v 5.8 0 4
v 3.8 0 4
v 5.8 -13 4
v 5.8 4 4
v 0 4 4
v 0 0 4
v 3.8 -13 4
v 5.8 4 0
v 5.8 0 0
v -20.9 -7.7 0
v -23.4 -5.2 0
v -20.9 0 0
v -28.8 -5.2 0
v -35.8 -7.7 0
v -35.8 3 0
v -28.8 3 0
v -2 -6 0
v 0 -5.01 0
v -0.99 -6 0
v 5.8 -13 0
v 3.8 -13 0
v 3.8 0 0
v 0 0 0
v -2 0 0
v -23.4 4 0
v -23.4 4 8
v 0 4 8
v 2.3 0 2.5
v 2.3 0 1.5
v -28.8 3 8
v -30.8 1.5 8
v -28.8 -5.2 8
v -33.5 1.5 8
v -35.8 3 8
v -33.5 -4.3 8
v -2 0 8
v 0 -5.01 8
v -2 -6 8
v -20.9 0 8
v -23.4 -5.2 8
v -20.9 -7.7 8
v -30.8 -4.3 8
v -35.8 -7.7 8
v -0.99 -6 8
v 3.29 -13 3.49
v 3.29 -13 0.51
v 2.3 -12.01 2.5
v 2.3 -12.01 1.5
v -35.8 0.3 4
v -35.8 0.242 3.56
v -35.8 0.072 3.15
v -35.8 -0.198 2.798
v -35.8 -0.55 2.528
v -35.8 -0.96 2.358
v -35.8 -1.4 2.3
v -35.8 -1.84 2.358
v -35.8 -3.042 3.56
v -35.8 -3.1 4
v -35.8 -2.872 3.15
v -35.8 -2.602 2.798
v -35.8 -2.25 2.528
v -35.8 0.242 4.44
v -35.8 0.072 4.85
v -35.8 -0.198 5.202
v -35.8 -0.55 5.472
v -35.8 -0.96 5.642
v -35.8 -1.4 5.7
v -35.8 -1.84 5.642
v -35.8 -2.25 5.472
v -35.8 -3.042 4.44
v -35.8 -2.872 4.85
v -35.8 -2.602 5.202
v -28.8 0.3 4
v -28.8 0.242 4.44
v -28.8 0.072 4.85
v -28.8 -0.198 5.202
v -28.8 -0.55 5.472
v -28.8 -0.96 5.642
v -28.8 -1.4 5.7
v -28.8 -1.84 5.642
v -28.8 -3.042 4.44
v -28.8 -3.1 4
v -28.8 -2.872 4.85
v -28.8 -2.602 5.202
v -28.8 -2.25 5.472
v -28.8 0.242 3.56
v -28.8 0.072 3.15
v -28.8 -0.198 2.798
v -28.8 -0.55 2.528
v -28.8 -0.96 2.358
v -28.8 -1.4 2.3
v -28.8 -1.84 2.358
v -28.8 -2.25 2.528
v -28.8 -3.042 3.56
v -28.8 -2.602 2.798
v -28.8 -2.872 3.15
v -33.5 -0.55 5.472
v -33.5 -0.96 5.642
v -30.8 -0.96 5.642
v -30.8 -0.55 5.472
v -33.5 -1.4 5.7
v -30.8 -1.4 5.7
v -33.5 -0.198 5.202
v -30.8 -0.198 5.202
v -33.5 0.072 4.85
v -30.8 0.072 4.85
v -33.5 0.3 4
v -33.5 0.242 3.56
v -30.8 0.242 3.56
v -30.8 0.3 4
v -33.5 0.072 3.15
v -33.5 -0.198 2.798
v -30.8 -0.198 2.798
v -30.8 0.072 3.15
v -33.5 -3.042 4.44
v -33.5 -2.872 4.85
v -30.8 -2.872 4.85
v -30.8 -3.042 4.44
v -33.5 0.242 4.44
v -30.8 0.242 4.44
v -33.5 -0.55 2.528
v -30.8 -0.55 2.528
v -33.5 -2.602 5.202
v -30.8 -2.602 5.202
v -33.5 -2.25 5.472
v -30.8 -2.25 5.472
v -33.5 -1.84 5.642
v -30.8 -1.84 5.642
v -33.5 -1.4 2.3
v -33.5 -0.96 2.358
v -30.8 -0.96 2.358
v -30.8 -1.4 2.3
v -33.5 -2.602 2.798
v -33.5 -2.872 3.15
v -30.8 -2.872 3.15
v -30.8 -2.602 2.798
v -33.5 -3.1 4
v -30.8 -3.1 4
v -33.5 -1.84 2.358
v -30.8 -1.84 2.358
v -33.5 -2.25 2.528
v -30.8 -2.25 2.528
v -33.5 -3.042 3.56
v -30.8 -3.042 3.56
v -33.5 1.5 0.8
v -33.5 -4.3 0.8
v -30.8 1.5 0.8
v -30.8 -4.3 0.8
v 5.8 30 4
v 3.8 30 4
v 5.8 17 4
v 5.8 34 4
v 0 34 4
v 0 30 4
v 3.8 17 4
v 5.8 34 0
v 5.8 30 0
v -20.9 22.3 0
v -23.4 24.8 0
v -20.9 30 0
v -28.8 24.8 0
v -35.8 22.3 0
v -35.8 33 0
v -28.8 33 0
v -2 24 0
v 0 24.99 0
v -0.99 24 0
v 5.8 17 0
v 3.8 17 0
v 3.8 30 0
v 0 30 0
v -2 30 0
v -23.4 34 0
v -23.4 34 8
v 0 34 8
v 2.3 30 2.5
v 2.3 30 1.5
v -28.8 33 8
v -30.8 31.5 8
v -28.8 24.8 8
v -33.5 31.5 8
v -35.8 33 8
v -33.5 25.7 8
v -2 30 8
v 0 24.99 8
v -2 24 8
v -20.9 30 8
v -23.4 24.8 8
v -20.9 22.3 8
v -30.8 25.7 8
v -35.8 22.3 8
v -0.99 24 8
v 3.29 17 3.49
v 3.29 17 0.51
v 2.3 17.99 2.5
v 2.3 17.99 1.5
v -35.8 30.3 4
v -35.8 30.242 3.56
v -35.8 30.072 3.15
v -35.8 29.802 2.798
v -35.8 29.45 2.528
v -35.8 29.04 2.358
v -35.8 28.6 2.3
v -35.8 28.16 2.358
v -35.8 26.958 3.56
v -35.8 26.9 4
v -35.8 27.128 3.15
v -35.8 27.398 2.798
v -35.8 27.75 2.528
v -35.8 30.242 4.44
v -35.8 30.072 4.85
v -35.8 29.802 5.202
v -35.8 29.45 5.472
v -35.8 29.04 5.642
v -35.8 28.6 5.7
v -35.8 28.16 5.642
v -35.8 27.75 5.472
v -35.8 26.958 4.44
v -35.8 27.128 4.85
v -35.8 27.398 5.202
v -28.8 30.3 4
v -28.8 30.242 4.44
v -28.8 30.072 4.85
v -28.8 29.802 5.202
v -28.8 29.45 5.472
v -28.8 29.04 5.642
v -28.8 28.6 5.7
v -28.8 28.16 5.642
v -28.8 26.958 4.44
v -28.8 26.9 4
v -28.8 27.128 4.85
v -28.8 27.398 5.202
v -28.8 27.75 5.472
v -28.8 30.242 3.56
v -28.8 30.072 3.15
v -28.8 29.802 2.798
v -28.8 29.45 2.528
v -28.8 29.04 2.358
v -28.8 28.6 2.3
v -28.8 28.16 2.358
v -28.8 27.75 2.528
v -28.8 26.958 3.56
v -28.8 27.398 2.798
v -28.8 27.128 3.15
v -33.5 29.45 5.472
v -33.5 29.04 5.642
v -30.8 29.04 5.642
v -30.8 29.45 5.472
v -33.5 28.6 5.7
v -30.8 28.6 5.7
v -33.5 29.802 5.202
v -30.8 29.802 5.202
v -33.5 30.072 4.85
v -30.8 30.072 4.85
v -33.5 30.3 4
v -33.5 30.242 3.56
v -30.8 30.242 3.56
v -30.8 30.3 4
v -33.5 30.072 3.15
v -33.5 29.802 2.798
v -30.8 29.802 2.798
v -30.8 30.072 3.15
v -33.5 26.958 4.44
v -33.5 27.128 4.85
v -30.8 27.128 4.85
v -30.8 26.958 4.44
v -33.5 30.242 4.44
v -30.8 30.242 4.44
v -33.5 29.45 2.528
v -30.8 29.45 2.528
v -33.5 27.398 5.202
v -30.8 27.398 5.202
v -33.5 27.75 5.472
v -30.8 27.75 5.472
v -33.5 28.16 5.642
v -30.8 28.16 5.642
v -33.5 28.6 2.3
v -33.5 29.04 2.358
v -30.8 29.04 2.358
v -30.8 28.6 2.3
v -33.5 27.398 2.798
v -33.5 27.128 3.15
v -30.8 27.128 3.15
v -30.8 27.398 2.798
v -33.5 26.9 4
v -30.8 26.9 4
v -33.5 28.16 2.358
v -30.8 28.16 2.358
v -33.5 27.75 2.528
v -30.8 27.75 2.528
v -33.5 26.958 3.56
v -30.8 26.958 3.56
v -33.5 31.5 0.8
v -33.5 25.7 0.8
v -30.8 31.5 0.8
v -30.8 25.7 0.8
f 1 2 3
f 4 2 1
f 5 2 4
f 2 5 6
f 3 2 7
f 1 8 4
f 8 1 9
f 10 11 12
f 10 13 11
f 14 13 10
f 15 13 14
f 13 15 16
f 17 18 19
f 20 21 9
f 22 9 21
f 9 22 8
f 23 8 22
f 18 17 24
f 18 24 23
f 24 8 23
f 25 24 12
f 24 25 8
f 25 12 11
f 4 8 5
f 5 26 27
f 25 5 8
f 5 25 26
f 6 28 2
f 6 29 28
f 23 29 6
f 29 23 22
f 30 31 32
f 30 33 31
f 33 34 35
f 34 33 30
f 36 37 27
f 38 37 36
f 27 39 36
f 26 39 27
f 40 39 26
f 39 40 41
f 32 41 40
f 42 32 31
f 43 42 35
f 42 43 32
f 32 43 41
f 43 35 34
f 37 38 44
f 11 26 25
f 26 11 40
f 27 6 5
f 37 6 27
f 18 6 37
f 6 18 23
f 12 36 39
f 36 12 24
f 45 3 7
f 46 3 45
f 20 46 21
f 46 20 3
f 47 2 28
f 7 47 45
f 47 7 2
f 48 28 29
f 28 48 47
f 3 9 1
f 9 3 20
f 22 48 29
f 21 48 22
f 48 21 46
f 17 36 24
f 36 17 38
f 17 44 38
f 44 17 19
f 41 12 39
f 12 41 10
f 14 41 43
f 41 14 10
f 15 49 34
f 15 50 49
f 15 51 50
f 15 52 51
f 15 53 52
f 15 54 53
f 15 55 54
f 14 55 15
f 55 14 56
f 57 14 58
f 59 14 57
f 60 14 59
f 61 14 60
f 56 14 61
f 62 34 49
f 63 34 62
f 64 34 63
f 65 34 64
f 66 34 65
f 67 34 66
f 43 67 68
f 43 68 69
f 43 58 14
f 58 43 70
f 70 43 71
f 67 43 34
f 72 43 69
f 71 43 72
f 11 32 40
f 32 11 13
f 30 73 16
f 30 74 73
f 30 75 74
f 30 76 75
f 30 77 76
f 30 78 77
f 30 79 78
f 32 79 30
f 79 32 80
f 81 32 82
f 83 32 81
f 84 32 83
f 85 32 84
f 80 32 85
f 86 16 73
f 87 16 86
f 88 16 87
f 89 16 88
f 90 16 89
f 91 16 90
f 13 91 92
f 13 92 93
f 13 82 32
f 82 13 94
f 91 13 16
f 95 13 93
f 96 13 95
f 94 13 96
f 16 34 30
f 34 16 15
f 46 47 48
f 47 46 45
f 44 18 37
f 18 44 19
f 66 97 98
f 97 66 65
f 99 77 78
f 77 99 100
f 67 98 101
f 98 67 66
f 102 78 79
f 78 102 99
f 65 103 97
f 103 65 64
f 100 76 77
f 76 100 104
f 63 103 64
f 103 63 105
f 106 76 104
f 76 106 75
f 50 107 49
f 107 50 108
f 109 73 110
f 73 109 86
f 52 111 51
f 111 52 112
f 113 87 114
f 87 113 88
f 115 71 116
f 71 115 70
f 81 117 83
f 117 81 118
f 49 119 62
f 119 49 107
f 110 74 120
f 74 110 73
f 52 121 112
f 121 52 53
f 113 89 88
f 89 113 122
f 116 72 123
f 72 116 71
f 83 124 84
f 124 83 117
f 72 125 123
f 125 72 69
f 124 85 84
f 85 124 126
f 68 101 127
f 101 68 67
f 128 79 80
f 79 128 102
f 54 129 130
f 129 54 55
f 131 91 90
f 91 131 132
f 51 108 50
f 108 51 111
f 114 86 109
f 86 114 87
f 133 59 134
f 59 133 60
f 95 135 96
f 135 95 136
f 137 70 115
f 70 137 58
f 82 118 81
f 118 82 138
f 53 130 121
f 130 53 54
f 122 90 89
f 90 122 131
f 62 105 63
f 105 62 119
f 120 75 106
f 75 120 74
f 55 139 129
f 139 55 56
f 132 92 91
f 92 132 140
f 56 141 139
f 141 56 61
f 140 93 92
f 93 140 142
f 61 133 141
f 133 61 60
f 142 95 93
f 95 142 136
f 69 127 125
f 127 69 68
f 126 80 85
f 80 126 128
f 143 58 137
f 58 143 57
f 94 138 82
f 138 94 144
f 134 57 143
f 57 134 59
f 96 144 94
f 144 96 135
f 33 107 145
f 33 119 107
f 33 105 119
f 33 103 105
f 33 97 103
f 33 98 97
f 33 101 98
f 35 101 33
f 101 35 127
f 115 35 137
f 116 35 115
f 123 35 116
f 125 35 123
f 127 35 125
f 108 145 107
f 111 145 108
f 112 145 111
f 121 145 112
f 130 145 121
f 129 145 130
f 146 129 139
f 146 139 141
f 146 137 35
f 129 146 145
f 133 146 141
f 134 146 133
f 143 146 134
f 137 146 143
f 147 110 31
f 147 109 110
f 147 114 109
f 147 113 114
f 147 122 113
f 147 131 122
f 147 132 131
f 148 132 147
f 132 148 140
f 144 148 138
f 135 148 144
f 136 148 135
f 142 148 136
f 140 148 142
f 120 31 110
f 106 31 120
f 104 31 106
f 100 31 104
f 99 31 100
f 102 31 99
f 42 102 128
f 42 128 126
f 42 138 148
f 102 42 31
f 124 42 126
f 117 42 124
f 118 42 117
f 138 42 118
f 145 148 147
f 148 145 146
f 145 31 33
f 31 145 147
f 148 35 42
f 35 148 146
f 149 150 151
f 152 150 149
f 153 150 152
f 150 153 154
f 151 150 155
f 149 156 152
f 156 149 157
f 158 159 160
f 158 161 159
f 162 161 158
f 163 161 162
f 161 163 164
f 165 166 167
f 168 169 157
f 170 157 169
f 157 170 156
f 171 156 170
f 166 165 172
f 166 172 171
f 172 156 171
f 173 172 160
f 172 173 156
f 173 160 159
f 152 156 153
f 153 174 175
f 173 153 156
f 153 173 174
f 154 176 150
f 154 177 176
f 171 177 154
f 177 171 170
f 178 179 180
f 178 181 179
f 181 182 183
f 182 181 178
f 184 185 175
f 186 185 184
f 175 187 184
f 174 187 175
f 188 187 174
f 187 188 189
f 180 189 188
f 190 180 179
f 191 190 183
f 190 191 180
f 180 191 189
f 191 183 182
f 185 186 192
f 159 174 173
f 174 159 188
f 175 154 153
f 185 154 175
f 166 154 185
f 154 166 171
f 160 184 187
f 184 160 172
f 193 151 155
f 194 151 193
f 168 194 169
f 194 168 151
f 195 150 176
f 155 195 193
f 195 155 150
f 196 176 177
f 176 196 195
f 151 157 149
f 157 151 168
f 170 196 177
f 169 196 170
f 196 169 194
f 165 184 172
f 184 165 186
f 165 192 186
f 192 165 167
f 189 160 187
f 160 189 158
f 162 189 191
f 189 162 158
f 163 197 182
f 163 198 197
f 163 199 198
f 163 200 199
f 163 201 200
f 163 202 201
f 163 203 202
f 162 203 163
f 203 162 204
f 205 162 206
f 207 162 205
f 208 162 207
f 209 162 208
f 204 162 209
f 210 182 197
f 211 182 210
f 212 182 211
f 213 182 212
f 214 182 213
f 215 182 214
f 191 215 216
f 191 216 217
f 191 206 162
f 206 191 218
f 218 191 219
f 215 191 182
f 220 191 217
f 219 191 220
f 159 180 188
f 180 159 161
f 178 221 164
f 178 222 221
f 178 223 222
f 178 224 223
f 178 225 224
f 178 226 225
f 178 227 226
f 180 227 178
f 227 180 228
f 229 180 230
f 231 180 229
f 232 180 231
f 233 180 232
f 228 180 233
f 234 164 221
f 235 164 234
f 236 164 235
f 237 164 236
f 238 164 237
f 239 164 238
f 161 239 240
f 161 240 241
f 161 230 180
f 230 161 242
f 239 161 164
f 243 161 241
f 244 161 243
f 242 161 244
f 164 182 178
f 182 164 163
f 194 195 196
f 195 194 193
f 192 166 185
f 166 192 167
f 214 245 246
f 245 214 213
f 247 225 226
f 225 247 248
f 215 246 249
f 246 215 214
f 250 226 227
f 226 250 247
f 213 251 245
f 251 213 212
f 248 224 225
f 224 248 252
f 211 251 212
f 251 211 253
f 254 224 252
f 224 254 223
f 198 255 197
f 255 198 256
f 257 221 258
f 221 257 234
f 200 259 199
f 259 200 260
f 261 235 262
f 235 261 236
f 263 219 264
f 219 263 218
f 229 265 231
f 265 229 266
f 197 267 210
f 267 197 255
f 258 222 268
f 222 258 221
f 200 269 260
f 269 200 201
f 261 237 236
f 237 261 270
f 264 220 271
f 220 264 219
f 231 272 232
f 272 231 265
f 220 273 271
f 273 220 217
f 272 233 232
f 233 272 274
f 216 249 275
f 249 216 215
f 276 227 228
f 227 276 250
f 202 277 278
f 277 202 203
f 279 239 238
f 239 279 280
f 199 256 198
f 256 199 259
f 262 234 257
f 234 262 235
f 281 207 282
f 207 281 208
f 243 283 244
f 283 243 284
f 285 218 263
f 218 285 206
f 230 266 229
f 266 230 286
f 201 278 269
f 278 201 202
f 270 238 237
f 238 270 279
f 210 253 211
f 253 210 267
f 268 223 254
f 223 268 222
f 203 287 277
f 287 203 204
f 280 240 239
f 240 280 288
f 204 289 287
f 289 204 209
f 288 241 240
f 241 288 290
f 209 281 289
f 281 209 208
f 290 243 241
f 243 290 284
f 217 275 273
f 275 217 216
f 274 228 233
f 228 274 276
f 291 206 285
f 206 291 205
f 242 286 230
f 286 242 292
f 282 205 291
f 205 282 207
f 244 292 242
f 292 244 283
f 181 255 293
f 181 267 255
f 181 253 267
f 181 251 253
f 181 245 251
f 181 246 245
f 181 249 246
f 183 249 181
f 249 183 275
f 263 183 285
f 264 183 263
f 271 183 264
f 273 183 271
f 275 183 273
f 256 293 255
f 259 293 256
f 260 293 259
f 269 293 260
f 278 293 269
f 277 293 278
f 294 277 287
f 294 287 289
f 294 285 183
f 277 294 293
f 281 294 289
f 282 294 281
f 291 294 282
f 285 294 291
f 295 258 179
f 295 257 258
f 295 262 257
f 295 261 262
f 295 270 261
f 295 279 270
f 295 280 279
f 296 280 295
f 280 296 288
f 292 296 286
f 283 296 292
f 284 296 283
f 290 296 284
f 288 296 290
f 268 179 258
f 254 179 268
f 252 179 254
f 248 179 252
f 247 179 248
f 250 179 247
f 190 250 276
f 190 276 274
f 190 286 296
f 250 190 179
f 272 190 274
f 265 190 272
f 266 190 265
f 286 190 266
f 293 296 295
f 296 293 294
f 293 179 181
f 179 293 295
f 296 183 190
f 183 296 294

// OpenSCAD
// Inverted-U thermostat panel clip v0.5. Units: mm.
// v0.5 (2026-10-11): the frame hung ~6 mm too low on v0.4 clips. The user
// measured the hinge-screw centre 58 mm below the case top versus 52 mm
// needed (dial top edge, measured 52 mm). The vent-seating part is unchanged
// (proven); only the rail cradle and its captive-nut clamp move UP 6.0 mm
// relative to the bridge, so the same printed frame hangs 6 mm higher.
// Everything below is v0.4.
// v0.4 (2026-10-03): the v0.3 M3 screw self-tapped into a 2.5 mm pilot and
// split the clip along its print layers (clip prints on its side). v0.4
// uses a 3.4 mm clearance hole and a captive M3 nut in a side pocket of a
// thicker (7 mm) cradle front wall, so the screw never wedges the plastic.
// Panel/vent geometry is unchanged from v0.3, described below.
//
// v0.3 (2026-09-30): the v0.2 5.0 mm leg was too wide for the real vent;
// the leg and everything behind the front face are now 4.0 mm wide (-1 mm,
// user direction). The vent is modelled at <= 5.0 mm (observed bound).
// Otherwise identical to v0.2, described below.
//
// v0.2: clip-only revision after the v0.1 clip test (photos/2026-09-30_*).
//
// Physical result of v0.1: the rear leg only partly entered the vent and the
// wider clip body stopped at the vent edge; the 3.0 mm leg gap wobbled on the
// 2.3 mm panel. Changes (user direction 2026-09-30):
// - Leg gap = 2.3 mm panel thickness (snug, no designed clearance).
// - Rear leg 5 mm longer (13 mm below the top surface instead of 8 mm).
// - Everything behind the front-face plane is 5.0 mm wide, never wider
//   than the 6.25 mm vent; leg front corners chamfered for the vent's
//   rounded front end.
// Unchanged: 8 mm clip width in front of the face, arm, U-hook and M3
// clamp, so the v0.1 rail stub and rail interface still apply.
//
// Model frame as v0.1: +Y up (0 = case top surface), +Z away from the
// wall, Z=0 thermostat front face, panel Z=-2.3..0. Local X = 0..clip_w.

part = "clips_plate"; // clip, clip_print, clips_plate, installed,
                      // clip_thermostat_collision
clip_count = 2;
$fn = 48;

// Measured / design parameters.
front_panel_t = 2.3;
slot_w = 5.0;                   // observed bound: 5.0 mm leg did not fit
slot_len = 21.5;
vent_tip_behind_face = 2.0;     // recorded rough; rounded vent front end
top_wall_t_proxy = 6.0;         // proxy only; photo shows deep slot walls
safe_depth = 20.0;

panel_clearance_per_side = 0.0; // snug by request
clip_w = 8.0;
narrow_w = 4.0;                 // everything behind the front face
front_leg_t = 2.0;
front_leg_len = 6.0;
rear_leg_t = 3.5;
rear_leg_len = 13.0;            // v0.1: 8.0; +5 mm by request
rear_leg_chamfer = 1.5;
beam_t = 4.0;
leg_tip_chamfer = 1.0;

// Rail / cradle interface: identical to v0.1.
ear_datum_z = 26.2;
motor_plate_t = 2.4;
rail_t = 5.0;
rail_h = 8.0;
rail_raise = 6.0;                   // v0.5: frame hangs 6 mm higher
rail_top_below_case_top = -3.0;     // v0.4: 3.0; = 3.0 - rail_raise
rail_clearance_per_side = 0.2;
cradle_wall_t = 2.5;
cradle_front_wall_t = 7.0;          // v0.3: 5.0; holds the nut pocket
cradle_floor_t = 2.5;
cradle_front_top_below_case_top = -3.0; // v0.4: 3.0; level with rail top
clamp_screw_clearance_d = 3.4;      // M3 clearance; v0.3 used a 2.5 mm pilot
clamp_screw_below_case_top = 1.4;   // v0.4: 7.4
nut_af = 5.5;                       // M3 nut across flats
nut_t = 2.4;
nut_pocket_clearance = 0.3;
nut_inner_skin = 2.0;               // between rail-side face and nut pocket
nut_pocket_floor = 0.8;             // pocket opens at X = clip_w (print top)

// --- Derived ------------------------------------------------------------------
rear_leg_z1 = -front_panel_t - panel_clearance_per_side;
rear_leg_z0 = rear_leg_z1 - rear_leg_t;
front_leg_z0 = panel_clearance_per_side;
front_leg_z1 = front_leg_z0 + front_leg_t;
rail_z1 = ear_datum_z + motor_plate_t;
rail_z0 = rail_z1 - rail_t;
cradle_hole_z0 = rail_z0 - rail_clearance_per_side;
cradle_hole_z1 = rail_z1 + rail_clearance_per_side;
cradle_back_z0 = cradle_hole_z0 - cradle_wall_t;
cradle_front_z1 = cradle_hole_z1 + cradle_front_wall_t;
cradle_y0 = -rail_top_below_case_top - rail_h - rail_clearance_per_side - cradle_floor_t;

assert(front_leg_z0 - rear_leg_z1 >= front_panel_t - 1e-9,
       "Leg gap must be at least the 2.3 mm panel.");
assert(narrow_w <= slot_w - 1.0, "Narrow section must clear the vent width.");
assert(rear_leg_len <= safe_depth - 5, "Rear leg must stay well inside safe depth.");

function nut_pocket_w() = nut_af + nut_pocket_clearance;
function nut_pocket_t() = nut_t + nut_pocket_clearance;
function nut_outer_skin() = cradle_front_wall_t - nut_inner_skin - nut_pocket_t();
function nut_top_skin() = -cradle_front_top_below_case_top
                          - (-clamp_screw_below_case_top + nut_pocket_w() / 2);
function nut_bottom_skin() = (-clamp_screw_below_case_top - nut_pocket_w() / 2)
                             - (cradle_y0 + cradle_floor_t);
assert(nut_outer_skin() >= 2.0, "Nut pocket outer skin too thin.");
assert(nut_top_skin() >= 1.5 && nut_bottom_skin() >= 0.0, "Nut pocket breaks the wall.");
assert(nut_pocket_floor + (nut_af / cos(30)) / 2 <= clip_w / 2,
       "Nut pocket must reach past the screw axis.");

// --- Clip ------------------------------------------------------------------------
module rear_leg_section() {
    // XZ section of the rear leg; front corners chamfered for the round
    // vent end. Extruded along Y.
    polygon([[0, rear_leg_z0], [narrow_w, rear_leg_z0],
             [narrow_w, rear_leg_z1 - rear_leg_chamfer],
             [narrow_w - rear_leg_chamfer, rear_leg_z1],
             [rear_leg_chamfer, rear_leg_z1],
             [0, rear_leg_z1 - rear_leg_chamfer]]);
}

module clip_local() {
    difference() {
        union() {
            // Narrow bridge part behind the front face.
            translate([0, 0, rear_leg_z0])
                cube([narrow_w, beam_t, -rear_leg_z0 + 0.01]);
            // Full-width bridge / arm in front of the face.
            cube([clip_w, beam_t, cradle_hole_z0]);
            // Rear leg (chamfered section), down from the bridge.
            translate([0, 0.01, 0]) rotate([90, 0, 0])
                linear_extrude(rear_leg_len + 0.01) rear_leg_section();
            // Front leg outside the face.
            translate([0, -front_leg_len, front_leg_z0])
                cube([clip_w, front_leg_len + 0.01, front_leg_t]);
            // U-hook cradle (unchanged from v0.1).
            translate([0, cradle_y0, cradle_back_z0])
                cube([clip_w, beam_t - cradle_y0, cradle_wall_t]);
            translate([0, cradle_y0, cradle_back_z0])
                cube([clip_w, cradle_floor_t, cradle_front_z1 - cradle_back_z0]);
            translate([0, cradle_y0, cradle_hole_z1])
                cube([clip_w, -cradle_front_top_below_case_top - cradle_y0,
                      cradle_front_wall_t]);
        }
        // Lead-in chamfers on both leg tips, on the faces toward the panel.
        translate([-0.01, -rear_leg_len, rear_leg_z1]) rotate([0, 90, 0])
            linear_extrude(clip_w + 0.02)
                polygon([[leg_tip_chamfer, -0.01], [-0.01, -0.01],
                         [-0.01, leg_tip_chamfer]]);
        translate([-0.01, -front_leg_len, front_leg_z0]) rotate([0, 90, 0])
            linear_extrude(clip_w + 0.02)
                polygon([[0.01, -0.01], [-leg_tip_chamfer, -0.01],
                         [0.01, leg_tip_chamfer]]);
        // M3 clearance hole along Z through the cradle front wall.
        translate([clip_w / 2, -clamp_screw_below_case_top, cradle_hole_z1 - 0.5])
            cylinder(d = clamp_screw_clearance_d, h = cradle_front_wall_t + 1.0, $fn = 24);
        // Captive-nut pocket: slides in from the X = clip_w face (top as printed).
        translate([nut_pocket_floor, -clamp_screw_below_case_top - nut_pocket_w() / 2,
                   cradle_hole_z1 + nut_inner_skin])
            cube([clip_w - nut_pocket_floor + 0.01, nut_pocket_w(), nut_pocket_t()]);
    }
}

// --- Cover proxy around one vent (for the collision check only) -------------------
module vent_proxy(skin = 0) {
    color([0.92, 0.92, 0.88, 0.5]) difference() {
        union() {
            translate([-10, -30, -front_panel_t + skin])
                cube([20, 30, front_panel_t - 2 * skin]);
            translate([-10, -top_wall_t_proxy, -28.5]) cube([20, top_wall_t_proxy, 28.5]);
        }
        // Vent: rounded front end, tip at vent_tip_behind_face.
        translate([0, 1, -vent_tip_behind_face - slot_w / 2]) rotate([90, 0, 0])
            linear_extrude(top_wall_t_proxy + 2) hull() {
                circle(d = slot_w);
                translate([0, -(slot_len - slot_w)]) circle(d = slot_w);
            }
    }
}

module installed_clip(lift = 0) {
    color([0.35, 0.65, 0.35]) translate([-narrow_w / 2, lift, 0]) clip_local();
}

module clip_print() { rotate([0, -90, 0]) clip_local(); }

// Reuse the printed v0.1 rail stub; the rail interface is unchanged.
module clips_plate() {
    for (i = [0:clip_count - 1]) translate([0, i * 30, 0]) clip_print();
}

if (part == "clip") clip_local();
else if (part == "clip_print") clip_print();
else if (part == "clips_plate") clips_plate();
else if (part == "installed") { vent_proxy(); installed_clip(); }
else if (part == "clip_thermostat_collision")
    // Legs intentionally touch both panel faces; skin ignores that contact.
    intersection() { installed_clip(0.02); vent_proxy(0.02); }
else assert(false, "Unknown part selector.");
